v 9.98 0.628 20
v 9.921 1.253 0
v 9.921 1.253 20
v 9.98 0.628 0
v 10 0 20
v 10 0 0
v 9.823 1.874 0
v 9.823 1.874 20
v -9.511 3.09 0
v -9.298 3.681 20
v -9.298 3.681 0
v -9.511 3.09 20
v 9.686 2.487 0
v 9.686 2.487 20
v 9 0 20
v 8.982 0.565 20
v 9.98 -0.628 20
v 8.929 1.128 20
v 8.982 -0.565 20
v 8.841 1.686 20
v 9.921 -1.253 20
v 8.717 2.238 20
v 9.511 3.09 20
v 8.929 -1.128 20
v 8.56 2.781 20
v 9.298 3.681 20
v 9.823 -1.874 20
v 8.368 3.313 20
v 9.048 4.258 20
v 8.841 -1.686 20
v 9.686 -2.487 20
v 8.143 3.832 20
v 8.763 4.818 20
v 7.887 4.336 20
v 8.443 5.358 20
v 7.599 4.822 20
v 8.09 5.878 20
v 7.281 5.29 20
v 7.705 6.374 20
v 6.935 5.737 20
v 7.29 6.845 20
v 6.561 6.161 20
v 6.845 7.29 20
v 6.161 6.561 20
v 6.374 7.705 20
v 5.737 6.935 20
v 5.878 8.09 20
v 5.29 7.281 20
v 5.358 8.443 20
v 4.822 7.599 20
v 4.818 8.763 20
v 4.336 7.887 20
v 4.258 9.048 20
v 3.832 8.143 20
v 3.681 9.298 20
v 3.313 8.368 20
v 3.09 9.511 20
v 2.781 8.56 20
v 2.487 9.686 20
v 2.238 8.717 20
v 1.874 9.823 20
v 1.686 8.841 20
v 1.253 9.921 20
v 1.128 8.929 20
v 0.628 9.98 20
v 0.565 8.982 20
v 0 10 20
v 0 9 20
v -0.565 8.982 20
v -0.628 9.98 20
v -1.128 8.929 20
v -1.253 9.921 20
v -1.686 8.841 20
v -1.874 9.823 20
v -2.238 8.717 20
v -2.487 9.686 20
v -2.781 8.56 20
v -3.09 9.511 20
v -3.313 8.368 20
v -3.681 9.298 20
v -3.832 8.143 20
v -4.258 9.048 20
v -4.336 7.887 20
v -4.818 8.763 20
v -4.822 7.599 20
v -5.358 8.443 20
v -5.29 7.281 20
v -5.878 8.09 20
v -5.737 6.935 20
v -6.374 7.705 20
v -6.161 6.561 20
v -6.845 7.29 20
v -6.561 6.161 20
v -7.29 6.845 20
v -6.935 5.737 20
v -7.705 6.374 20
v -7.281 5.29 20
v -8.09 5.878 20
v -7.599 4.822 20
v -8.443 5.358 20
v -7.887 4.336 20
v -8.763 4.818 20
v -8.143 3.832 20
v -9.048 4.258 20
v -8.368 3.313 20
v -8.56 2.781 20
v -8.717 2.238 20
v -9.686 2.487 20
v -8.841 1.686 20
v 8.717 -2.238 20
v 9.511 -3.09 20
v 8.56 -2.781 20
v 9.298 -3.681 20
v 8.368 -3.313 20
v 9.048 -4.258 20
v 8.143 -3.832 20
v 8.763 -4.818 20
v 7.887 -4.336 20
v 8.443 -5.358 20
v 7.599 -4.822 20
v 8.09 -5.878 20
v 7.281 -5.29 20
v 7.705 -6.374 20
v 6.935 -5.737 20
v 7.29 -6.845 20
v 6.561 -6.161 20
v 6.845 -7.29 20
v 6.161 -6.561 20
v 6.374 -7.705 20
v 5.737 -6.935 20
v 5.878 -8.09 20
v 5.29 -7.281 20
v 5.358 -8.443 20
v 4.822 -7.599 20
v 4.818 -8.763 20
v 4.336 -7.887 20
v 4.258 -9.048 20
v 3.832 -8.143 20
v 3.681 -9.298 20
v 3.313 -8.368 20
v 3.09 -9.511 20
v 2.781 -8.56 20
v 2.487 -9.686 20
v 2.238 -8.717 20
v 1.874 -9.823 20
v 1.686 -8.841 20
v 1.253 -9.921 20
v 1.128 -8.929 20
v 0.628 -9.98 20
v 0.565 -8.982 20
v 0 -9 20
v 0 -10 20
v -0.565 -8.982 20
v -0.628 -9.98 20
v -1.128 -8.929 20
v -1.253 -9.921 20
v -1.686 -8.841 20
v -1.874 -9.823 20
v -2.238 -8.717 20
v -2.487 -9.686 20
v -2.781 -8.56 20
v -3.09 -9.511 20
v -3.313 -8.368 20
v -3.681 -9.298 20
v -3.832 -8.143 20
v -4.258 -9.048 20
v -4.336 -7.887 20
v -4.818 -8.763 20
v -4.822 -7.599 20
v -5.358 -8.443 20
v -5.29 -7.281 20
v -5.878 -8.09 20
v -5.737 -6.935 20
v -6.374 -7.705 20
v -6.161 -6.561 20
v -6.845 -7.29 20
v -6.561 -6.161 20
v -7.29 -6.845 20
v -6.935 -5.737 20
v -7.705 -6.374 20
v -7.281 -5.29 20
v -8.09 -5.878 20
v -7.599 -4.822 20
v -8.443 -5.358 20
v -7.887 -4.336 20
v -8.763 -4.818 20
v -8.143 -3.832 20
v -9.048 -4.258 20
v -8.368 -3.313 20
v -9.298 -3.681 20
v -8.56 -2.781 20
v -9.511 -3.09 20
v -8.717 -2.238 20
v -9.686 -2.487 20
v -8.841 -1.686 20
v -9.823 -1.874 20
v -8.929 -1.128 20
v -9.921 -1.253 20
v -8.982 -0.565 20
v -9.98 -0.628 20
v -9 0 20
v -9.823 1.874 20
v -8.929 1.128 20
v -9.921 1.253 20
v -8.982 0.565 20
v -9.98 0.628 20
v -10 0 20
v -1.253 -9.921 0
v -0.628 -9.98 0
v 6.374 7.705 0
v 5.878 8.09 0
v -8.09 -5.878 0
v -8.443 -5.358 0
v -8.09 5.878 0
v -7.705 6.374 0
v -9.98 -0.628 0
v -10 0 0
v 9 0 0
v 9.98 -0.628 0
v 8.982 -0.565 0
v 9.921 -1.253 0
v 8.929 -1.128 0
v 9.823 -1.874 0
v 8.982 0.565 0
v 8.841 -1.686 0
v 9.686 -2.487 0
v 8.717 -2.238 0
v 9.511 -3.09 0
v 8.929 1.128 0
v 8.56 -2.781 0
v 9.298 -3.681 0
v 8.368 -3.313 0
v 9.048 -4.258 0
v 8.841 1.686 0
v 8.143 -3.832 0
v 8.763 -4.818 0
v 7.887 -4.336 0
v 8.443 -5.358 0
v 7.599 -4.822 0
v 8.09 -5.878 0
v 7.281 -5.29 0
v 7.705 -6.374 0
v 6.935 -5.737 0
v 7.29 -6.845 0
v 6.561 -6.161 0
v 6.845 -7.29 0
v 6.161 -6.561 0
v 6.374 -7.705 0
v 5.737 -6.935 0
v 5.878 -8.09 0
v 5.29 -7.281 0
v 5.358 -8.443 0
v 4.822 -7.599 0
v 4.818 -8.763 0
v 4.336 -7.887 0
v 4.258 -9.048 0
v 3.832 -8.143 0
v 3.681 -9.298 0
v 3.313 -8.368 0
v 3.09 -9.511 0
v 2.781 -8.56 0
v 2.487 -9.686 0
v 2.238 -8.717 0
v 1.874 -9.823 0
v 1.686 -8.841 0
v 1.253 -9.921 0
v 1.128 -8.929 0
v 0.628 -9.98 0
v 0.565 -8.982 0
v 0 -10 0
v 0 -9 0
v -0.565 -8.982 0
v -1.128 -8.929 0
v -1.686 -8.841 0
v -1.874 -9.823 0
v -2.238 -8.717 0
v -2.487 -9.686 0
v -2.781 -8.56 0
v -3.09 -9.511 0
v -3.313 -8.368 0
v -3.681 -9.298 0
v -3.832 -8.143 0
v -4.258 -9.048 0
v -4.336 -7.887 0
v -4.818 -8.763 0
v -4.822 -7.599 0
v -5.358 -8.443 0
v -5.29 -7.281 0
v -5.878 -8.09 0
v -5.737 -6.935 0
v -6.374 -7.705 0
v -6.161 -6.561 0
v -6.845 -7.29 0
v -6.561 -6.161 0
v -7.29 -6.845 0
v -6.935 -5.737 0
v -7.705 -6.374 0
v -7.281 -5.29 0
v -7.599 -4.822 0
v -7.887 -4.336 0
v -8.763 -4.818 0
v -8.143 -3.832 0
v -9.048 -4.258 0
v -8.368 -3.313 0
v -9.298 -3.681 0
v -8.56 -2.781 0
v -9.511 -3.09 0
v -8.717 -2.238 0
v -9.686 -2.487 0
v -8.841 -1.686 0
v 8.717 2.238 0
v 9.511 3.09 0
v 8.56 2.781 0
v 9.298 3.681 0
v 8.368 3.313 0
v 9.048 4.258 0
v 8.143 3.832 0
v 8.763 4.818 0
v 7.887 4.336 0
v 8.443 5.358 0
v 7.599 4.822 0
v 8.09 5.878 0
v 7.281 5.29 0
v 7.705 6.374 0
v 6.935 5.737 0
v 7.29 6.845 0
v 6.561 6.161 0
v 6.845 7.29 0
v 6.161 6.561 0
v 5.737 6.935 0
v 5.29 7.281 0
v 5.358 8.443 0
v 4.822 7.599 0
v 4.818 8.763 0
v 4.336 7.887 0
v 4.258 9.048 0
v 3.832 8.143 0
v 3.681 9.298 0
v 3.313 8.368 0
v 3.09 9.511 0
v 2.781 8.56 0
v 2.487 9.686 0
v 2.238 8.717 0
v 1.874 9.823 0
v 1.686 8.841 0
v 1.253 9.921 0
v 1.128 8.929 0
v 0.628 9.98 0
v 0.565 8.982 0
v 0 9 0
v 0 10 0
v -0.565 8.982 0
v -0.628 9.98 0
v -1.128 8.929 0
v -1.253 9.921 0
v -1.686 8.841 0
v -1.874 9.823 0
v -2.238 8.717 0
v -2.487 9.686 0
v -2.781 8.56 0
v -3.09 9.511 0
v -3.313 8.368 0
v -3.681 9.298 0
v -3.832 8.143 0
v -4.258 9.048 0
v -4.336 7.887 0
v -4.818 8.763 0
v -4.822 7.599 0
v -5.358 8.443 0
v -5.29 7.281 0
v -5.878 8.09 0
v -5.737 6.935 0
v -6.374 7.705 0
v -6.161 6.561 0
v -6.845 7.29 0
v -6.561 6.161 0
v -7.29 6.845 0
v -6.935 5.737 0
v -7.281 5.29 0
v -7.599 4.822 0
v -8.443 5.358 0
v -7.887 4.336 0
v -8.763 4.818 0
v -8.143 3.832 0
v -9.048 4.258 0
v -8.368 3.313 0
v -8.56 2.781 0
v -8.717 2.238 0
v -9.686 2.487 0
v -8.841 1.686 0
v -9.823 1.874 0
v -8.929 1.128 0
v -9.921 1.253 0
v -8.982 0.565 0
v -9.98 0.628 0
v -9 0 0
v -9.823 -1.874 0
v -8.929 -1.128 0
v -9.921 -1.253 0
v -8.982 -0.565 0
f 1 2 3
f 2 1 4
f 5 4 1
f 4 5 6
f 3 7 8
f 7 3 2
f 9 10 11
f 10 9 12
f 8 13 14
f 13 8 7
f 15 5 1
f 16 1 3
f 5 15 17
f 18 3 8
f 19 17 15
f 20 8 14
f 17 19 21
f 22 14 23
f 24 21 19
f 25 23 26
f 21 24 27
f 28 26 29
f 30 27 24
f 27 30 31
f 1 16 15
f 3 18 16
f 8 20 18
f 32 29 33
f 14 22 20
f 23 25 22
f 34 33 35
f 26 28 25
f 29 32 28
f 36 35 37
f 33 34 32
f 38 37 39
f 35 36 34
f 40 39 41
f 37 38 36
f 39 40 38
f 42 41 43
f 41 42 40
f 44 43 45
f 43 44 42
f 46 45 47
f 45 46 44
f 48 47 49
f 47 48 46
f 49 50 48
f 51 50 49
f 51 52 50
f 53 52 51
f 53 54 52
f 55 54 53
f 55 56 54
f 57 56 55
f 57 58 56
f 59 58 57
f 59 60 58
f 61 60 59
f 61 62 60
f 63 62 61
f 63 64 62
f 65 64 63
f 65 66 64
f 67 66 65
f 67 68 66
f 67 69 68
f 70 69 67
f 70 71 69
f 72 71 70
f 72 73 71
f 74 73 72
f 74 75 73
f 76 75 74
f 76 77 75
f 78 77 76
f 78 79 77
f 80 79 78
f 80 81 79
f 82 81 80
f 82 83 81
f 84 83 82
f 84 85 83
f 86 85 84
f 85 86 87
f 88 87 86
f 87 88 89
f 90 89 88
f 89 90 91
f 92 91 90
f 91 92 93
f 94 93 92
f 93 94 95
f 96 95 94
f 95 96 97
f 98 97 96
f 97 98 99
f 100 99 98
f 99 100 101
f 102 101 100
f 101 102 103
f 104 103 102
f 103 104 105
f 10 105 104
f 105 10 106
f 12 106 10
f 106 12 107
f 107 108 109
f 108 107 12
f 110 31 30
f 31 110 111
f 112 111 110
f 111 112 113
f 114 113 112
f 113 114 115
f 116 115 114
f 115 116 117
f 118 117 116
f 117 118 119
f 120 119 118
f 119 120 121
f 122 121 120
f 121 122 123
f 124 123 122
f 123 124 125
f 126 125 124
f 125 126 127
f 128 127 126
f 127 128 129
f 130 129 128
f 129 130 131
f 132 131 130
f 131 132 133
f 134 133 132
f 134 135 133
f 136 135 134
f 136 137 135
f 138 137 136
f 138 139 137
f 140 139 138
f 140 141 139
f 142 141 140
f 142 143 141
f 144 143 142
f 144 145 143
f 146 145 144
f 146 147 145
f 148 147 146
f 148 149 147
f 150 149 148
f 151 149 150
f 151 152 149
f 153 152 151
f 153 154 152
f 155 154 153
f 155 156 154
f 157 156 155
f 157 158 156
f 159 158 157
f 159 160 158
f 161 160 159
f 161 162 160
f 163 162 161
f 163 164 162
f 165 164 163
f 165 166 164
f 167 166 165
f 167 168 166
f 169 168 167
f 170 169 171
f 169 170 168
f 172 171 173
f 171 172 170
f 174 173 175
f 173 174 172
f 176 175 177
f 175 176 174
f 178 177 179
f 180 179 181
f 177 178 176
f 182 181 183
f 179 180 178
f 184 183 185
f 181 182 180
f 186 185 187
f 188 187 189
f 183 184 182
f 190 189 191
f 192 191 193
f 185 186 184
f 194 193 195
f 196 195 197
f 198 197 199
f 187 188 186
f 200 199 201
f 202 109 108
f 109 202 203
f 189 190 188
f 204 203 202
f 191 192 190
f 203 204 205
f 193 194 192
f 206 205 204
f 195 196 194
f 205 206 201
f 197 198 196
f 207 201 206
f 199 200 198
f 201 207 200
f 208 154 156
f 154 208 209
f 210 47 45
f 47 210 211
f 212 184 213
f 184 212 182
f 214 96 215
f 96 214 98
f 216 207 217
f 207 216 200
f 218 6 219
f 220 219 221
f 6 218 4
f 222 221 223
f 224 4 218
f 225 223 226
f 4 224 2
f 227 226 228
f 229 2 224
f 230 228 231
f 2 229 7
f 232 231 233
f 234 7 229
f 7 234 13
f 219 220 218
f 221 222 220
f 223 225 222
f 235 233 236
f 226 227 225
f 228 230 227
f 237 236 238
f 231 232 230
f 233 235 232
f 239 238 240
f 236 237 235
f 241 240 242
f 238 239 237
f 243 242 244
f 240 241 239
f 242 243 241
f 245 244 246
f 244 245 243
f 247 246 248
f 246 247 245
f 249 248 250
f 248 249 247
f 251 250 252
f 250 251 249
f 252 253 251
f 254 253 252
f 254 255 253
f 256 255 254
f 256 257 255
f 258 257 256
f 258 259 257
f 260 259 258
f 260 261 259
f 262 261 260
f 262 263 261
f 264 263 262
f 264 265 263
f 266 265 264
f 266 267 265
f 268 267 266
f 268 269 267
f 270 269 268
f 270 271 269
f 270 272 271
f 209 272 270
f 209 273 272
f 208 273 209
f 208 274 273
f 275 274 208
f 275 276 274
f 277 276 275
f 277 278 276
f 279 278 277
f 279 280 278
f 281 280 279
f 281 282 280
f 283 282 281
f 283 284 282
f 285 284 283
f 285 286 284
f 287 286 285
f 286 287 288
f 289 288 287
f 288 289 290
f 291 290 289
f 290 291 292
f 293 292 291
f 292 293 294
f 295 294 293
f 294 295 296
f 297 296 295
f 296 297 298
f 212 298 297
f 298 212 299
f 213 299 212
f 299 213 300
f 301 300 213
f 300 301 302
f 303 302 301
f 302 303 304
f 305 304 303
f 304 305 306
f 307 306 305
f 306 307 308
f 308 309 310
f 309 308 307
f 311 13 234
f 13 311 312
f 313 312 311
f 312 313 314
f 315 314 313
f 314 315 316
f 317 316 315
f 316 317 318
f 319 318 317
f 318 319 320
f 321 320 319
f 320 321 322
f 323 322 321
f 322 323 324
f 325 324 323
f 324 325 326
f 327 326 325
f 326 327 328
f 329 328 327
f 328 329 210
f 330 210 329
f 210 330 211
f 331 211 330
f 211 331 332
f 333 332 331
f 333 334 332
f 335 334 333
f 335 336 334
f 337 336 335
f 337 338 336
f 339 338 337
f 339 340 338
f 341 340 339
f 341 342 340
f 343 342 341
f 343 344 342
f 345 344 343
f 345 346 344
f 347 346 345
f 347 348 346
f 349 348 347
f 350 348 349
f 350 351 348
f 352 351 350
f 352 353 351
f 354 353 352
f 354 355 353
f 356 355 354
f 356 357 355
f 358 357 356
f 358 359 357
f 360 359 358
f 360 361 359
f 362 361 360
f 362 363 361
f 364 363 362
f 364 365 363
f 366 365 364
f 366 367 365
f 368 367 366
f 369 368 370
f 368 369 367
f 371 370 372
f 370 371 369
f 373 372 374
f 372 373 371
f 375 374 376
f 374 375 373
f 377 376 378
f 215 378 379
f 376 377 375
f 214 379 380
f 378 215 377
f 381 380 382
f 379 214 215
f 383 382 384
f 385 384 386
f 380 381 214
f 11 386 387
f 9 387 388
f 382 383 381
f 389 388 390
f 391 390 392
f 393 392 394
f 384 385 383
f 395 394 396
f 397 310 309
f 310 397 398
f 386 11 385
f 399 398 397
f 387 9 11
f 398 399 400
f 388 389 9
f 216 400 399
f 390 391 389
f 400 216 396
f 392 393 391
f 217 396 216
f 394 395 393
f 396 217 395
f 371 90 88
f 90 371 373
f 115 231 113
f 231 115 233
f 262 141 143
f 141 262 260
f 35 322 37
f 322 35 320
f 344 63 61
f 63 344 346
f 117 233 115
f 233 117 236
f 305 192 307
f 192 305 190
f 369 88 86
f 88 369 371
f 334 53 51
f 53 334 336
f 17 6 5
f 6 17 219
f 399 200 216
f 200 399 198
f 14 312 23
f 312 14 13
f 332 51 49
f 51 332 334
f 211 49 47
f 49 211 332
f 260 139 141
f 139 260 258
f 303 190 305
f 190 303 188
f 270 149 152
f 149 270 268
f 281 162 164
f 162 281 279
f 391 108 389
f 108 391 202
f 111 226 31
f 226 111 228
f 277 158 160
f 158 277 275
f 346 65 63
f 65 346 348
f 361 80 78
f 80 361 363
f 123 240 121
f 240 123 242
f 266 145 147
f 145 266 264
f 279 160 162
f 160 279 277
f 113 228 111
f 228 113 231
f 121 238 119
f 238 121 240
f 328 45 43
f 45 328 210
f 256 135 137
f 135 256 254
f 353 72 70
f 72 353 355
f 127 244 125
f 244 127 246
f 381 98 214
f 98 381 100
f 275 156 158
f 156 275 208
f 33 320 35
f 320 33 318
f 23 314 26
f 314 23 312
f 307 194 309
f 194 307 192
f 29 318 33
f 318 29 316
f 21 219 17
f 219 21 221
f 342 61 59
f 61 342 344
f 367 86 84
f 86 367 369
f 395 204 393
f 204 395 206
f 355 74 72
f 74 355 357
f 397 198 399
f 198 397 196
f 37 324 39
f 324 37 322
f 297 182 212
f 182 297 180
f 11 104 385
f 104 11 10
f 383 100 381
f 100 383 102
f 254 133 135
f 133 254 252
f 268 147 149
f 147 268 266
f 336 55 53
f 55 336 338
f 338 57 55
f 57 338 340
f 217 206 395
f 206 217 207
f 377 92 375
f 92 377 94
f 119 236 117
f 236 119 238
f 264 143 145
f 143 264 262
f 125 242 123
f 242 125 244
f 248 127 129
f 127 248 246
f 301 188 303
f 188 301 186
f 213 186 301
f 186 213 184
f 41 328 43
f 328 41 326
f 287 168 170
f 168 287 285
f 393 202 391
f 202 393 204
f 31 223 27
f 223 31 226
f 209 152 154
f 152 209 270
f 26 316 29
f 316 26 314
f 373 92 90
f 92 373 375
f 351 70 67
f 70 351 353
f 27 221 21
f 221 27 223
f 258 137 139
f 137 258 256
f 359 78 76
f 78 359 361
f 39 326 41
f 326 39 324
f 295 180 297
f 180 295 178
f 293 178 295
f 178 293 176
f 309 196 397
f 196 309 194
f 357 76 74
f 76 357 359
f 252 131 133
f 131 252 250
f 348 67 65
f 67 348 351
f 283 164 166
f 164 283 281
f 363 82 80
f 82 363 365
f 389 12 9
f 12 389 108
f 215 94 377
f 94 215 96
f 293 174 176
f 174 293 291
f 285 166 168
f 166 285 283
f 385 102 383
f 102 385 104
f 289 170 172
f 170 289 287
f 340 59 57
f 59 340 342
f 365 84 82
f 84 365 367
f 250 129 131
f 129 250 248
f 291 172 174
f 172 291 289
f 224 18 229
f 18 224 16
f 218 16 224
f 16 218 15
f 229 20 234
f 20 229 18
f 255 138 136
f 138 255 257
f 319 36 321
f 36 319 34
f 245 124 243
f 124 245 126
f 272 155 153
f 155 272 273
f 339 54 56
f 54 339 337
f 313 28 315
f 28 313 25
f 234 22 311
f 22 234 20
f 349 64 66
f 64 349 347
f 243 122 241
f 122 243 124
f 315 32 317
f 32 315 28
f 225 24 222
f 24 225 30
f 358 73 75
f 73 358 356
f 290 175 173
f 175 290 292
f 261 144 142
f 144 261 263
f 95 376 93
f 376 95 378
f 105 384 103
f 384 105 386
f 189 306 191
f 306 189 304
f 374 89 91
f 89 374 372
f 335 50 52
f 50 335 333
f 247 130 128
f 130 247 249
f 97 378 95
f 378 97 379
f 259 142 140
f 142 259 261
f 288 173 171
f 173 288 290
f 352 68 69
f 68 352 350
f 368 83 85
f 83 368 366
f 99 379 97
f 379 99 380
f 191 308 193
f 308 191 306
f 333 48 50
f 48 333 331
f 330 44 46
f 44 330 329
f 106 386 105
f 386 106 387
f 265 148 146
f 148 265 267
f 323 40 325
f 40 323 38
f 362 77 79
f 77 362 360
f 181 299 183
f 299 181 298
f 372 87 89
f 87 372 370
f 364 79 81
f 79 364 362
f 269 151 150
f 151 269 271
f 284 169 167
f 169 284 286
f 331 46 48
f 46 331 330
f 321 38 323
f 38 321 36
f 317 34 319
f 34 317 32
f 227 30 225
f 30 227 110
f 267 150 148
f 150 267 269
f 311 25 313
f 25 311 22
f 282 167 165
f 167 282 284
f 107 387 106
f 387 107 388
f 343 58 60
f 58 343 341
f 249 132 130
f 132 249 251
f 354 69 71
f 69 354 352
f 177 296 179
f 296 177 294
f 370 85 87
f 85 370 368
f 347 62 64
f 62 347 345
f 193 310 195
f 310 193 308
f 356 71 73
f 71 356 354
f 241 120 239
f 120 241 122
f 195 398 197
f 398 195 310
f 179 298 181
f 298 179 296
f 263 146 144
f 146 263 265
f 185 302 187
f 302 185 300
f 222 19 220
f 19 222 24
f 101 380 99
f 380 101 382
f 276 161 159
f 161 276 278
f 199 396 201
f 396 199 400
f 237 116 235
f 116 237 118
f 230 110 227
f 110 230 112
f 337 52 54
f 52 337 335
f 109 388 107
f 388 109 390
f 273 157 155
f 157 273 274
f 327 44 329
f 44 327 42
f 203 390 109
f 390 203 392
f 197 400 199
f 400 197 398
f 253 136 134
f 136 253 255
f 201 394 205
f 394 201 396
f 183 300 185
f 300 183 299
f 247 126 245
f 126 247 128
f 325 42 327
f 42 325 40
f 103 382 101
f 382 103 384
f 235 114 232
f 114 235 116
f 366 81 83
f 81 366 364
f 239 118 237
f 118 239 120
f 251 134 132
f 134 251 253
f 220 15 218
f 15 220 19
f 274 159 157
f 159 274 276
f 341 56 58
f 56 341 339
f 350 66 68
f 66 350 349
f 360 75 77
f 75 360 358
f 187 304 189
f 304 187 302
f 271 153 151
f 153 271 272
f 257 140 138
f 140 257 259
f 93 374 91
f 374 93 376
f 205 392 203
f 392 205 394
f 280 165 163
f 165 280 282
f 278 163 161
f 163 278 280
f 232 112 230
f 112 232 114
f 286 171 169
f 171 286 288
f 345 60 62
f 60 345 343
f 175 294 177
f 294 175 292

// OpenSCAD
// file: ../configurations/global.scad
knob_facade_a_piece_height = 20;
knob_facade_a_piece_diameter = 20;
knob_facade_a_piece_wall_thickness = 2;

knob_facade_b_piece_height = 20;
knob_facade_b_piece_diameter = 20;
knob_facade_b_piece_wall_thickness = 2;
// main file
include <../configurations/global.scad>;

module knobFacadeAPiece(
    height = knob_facade_a_piece_height,
    diameter = knob_facade_a_piece_diameter,
    wall_thickness = knob_facade_a_piece_wall_thickness
) {
    difference() {
        cylinder(h = height, d = diameter, $fn=100);
        translate([0, 0, -1])
        cylinder(h = height + 2, d = diameter - wall_thickness, $fn=100);
    }
}

knobFacadeAPiece();
